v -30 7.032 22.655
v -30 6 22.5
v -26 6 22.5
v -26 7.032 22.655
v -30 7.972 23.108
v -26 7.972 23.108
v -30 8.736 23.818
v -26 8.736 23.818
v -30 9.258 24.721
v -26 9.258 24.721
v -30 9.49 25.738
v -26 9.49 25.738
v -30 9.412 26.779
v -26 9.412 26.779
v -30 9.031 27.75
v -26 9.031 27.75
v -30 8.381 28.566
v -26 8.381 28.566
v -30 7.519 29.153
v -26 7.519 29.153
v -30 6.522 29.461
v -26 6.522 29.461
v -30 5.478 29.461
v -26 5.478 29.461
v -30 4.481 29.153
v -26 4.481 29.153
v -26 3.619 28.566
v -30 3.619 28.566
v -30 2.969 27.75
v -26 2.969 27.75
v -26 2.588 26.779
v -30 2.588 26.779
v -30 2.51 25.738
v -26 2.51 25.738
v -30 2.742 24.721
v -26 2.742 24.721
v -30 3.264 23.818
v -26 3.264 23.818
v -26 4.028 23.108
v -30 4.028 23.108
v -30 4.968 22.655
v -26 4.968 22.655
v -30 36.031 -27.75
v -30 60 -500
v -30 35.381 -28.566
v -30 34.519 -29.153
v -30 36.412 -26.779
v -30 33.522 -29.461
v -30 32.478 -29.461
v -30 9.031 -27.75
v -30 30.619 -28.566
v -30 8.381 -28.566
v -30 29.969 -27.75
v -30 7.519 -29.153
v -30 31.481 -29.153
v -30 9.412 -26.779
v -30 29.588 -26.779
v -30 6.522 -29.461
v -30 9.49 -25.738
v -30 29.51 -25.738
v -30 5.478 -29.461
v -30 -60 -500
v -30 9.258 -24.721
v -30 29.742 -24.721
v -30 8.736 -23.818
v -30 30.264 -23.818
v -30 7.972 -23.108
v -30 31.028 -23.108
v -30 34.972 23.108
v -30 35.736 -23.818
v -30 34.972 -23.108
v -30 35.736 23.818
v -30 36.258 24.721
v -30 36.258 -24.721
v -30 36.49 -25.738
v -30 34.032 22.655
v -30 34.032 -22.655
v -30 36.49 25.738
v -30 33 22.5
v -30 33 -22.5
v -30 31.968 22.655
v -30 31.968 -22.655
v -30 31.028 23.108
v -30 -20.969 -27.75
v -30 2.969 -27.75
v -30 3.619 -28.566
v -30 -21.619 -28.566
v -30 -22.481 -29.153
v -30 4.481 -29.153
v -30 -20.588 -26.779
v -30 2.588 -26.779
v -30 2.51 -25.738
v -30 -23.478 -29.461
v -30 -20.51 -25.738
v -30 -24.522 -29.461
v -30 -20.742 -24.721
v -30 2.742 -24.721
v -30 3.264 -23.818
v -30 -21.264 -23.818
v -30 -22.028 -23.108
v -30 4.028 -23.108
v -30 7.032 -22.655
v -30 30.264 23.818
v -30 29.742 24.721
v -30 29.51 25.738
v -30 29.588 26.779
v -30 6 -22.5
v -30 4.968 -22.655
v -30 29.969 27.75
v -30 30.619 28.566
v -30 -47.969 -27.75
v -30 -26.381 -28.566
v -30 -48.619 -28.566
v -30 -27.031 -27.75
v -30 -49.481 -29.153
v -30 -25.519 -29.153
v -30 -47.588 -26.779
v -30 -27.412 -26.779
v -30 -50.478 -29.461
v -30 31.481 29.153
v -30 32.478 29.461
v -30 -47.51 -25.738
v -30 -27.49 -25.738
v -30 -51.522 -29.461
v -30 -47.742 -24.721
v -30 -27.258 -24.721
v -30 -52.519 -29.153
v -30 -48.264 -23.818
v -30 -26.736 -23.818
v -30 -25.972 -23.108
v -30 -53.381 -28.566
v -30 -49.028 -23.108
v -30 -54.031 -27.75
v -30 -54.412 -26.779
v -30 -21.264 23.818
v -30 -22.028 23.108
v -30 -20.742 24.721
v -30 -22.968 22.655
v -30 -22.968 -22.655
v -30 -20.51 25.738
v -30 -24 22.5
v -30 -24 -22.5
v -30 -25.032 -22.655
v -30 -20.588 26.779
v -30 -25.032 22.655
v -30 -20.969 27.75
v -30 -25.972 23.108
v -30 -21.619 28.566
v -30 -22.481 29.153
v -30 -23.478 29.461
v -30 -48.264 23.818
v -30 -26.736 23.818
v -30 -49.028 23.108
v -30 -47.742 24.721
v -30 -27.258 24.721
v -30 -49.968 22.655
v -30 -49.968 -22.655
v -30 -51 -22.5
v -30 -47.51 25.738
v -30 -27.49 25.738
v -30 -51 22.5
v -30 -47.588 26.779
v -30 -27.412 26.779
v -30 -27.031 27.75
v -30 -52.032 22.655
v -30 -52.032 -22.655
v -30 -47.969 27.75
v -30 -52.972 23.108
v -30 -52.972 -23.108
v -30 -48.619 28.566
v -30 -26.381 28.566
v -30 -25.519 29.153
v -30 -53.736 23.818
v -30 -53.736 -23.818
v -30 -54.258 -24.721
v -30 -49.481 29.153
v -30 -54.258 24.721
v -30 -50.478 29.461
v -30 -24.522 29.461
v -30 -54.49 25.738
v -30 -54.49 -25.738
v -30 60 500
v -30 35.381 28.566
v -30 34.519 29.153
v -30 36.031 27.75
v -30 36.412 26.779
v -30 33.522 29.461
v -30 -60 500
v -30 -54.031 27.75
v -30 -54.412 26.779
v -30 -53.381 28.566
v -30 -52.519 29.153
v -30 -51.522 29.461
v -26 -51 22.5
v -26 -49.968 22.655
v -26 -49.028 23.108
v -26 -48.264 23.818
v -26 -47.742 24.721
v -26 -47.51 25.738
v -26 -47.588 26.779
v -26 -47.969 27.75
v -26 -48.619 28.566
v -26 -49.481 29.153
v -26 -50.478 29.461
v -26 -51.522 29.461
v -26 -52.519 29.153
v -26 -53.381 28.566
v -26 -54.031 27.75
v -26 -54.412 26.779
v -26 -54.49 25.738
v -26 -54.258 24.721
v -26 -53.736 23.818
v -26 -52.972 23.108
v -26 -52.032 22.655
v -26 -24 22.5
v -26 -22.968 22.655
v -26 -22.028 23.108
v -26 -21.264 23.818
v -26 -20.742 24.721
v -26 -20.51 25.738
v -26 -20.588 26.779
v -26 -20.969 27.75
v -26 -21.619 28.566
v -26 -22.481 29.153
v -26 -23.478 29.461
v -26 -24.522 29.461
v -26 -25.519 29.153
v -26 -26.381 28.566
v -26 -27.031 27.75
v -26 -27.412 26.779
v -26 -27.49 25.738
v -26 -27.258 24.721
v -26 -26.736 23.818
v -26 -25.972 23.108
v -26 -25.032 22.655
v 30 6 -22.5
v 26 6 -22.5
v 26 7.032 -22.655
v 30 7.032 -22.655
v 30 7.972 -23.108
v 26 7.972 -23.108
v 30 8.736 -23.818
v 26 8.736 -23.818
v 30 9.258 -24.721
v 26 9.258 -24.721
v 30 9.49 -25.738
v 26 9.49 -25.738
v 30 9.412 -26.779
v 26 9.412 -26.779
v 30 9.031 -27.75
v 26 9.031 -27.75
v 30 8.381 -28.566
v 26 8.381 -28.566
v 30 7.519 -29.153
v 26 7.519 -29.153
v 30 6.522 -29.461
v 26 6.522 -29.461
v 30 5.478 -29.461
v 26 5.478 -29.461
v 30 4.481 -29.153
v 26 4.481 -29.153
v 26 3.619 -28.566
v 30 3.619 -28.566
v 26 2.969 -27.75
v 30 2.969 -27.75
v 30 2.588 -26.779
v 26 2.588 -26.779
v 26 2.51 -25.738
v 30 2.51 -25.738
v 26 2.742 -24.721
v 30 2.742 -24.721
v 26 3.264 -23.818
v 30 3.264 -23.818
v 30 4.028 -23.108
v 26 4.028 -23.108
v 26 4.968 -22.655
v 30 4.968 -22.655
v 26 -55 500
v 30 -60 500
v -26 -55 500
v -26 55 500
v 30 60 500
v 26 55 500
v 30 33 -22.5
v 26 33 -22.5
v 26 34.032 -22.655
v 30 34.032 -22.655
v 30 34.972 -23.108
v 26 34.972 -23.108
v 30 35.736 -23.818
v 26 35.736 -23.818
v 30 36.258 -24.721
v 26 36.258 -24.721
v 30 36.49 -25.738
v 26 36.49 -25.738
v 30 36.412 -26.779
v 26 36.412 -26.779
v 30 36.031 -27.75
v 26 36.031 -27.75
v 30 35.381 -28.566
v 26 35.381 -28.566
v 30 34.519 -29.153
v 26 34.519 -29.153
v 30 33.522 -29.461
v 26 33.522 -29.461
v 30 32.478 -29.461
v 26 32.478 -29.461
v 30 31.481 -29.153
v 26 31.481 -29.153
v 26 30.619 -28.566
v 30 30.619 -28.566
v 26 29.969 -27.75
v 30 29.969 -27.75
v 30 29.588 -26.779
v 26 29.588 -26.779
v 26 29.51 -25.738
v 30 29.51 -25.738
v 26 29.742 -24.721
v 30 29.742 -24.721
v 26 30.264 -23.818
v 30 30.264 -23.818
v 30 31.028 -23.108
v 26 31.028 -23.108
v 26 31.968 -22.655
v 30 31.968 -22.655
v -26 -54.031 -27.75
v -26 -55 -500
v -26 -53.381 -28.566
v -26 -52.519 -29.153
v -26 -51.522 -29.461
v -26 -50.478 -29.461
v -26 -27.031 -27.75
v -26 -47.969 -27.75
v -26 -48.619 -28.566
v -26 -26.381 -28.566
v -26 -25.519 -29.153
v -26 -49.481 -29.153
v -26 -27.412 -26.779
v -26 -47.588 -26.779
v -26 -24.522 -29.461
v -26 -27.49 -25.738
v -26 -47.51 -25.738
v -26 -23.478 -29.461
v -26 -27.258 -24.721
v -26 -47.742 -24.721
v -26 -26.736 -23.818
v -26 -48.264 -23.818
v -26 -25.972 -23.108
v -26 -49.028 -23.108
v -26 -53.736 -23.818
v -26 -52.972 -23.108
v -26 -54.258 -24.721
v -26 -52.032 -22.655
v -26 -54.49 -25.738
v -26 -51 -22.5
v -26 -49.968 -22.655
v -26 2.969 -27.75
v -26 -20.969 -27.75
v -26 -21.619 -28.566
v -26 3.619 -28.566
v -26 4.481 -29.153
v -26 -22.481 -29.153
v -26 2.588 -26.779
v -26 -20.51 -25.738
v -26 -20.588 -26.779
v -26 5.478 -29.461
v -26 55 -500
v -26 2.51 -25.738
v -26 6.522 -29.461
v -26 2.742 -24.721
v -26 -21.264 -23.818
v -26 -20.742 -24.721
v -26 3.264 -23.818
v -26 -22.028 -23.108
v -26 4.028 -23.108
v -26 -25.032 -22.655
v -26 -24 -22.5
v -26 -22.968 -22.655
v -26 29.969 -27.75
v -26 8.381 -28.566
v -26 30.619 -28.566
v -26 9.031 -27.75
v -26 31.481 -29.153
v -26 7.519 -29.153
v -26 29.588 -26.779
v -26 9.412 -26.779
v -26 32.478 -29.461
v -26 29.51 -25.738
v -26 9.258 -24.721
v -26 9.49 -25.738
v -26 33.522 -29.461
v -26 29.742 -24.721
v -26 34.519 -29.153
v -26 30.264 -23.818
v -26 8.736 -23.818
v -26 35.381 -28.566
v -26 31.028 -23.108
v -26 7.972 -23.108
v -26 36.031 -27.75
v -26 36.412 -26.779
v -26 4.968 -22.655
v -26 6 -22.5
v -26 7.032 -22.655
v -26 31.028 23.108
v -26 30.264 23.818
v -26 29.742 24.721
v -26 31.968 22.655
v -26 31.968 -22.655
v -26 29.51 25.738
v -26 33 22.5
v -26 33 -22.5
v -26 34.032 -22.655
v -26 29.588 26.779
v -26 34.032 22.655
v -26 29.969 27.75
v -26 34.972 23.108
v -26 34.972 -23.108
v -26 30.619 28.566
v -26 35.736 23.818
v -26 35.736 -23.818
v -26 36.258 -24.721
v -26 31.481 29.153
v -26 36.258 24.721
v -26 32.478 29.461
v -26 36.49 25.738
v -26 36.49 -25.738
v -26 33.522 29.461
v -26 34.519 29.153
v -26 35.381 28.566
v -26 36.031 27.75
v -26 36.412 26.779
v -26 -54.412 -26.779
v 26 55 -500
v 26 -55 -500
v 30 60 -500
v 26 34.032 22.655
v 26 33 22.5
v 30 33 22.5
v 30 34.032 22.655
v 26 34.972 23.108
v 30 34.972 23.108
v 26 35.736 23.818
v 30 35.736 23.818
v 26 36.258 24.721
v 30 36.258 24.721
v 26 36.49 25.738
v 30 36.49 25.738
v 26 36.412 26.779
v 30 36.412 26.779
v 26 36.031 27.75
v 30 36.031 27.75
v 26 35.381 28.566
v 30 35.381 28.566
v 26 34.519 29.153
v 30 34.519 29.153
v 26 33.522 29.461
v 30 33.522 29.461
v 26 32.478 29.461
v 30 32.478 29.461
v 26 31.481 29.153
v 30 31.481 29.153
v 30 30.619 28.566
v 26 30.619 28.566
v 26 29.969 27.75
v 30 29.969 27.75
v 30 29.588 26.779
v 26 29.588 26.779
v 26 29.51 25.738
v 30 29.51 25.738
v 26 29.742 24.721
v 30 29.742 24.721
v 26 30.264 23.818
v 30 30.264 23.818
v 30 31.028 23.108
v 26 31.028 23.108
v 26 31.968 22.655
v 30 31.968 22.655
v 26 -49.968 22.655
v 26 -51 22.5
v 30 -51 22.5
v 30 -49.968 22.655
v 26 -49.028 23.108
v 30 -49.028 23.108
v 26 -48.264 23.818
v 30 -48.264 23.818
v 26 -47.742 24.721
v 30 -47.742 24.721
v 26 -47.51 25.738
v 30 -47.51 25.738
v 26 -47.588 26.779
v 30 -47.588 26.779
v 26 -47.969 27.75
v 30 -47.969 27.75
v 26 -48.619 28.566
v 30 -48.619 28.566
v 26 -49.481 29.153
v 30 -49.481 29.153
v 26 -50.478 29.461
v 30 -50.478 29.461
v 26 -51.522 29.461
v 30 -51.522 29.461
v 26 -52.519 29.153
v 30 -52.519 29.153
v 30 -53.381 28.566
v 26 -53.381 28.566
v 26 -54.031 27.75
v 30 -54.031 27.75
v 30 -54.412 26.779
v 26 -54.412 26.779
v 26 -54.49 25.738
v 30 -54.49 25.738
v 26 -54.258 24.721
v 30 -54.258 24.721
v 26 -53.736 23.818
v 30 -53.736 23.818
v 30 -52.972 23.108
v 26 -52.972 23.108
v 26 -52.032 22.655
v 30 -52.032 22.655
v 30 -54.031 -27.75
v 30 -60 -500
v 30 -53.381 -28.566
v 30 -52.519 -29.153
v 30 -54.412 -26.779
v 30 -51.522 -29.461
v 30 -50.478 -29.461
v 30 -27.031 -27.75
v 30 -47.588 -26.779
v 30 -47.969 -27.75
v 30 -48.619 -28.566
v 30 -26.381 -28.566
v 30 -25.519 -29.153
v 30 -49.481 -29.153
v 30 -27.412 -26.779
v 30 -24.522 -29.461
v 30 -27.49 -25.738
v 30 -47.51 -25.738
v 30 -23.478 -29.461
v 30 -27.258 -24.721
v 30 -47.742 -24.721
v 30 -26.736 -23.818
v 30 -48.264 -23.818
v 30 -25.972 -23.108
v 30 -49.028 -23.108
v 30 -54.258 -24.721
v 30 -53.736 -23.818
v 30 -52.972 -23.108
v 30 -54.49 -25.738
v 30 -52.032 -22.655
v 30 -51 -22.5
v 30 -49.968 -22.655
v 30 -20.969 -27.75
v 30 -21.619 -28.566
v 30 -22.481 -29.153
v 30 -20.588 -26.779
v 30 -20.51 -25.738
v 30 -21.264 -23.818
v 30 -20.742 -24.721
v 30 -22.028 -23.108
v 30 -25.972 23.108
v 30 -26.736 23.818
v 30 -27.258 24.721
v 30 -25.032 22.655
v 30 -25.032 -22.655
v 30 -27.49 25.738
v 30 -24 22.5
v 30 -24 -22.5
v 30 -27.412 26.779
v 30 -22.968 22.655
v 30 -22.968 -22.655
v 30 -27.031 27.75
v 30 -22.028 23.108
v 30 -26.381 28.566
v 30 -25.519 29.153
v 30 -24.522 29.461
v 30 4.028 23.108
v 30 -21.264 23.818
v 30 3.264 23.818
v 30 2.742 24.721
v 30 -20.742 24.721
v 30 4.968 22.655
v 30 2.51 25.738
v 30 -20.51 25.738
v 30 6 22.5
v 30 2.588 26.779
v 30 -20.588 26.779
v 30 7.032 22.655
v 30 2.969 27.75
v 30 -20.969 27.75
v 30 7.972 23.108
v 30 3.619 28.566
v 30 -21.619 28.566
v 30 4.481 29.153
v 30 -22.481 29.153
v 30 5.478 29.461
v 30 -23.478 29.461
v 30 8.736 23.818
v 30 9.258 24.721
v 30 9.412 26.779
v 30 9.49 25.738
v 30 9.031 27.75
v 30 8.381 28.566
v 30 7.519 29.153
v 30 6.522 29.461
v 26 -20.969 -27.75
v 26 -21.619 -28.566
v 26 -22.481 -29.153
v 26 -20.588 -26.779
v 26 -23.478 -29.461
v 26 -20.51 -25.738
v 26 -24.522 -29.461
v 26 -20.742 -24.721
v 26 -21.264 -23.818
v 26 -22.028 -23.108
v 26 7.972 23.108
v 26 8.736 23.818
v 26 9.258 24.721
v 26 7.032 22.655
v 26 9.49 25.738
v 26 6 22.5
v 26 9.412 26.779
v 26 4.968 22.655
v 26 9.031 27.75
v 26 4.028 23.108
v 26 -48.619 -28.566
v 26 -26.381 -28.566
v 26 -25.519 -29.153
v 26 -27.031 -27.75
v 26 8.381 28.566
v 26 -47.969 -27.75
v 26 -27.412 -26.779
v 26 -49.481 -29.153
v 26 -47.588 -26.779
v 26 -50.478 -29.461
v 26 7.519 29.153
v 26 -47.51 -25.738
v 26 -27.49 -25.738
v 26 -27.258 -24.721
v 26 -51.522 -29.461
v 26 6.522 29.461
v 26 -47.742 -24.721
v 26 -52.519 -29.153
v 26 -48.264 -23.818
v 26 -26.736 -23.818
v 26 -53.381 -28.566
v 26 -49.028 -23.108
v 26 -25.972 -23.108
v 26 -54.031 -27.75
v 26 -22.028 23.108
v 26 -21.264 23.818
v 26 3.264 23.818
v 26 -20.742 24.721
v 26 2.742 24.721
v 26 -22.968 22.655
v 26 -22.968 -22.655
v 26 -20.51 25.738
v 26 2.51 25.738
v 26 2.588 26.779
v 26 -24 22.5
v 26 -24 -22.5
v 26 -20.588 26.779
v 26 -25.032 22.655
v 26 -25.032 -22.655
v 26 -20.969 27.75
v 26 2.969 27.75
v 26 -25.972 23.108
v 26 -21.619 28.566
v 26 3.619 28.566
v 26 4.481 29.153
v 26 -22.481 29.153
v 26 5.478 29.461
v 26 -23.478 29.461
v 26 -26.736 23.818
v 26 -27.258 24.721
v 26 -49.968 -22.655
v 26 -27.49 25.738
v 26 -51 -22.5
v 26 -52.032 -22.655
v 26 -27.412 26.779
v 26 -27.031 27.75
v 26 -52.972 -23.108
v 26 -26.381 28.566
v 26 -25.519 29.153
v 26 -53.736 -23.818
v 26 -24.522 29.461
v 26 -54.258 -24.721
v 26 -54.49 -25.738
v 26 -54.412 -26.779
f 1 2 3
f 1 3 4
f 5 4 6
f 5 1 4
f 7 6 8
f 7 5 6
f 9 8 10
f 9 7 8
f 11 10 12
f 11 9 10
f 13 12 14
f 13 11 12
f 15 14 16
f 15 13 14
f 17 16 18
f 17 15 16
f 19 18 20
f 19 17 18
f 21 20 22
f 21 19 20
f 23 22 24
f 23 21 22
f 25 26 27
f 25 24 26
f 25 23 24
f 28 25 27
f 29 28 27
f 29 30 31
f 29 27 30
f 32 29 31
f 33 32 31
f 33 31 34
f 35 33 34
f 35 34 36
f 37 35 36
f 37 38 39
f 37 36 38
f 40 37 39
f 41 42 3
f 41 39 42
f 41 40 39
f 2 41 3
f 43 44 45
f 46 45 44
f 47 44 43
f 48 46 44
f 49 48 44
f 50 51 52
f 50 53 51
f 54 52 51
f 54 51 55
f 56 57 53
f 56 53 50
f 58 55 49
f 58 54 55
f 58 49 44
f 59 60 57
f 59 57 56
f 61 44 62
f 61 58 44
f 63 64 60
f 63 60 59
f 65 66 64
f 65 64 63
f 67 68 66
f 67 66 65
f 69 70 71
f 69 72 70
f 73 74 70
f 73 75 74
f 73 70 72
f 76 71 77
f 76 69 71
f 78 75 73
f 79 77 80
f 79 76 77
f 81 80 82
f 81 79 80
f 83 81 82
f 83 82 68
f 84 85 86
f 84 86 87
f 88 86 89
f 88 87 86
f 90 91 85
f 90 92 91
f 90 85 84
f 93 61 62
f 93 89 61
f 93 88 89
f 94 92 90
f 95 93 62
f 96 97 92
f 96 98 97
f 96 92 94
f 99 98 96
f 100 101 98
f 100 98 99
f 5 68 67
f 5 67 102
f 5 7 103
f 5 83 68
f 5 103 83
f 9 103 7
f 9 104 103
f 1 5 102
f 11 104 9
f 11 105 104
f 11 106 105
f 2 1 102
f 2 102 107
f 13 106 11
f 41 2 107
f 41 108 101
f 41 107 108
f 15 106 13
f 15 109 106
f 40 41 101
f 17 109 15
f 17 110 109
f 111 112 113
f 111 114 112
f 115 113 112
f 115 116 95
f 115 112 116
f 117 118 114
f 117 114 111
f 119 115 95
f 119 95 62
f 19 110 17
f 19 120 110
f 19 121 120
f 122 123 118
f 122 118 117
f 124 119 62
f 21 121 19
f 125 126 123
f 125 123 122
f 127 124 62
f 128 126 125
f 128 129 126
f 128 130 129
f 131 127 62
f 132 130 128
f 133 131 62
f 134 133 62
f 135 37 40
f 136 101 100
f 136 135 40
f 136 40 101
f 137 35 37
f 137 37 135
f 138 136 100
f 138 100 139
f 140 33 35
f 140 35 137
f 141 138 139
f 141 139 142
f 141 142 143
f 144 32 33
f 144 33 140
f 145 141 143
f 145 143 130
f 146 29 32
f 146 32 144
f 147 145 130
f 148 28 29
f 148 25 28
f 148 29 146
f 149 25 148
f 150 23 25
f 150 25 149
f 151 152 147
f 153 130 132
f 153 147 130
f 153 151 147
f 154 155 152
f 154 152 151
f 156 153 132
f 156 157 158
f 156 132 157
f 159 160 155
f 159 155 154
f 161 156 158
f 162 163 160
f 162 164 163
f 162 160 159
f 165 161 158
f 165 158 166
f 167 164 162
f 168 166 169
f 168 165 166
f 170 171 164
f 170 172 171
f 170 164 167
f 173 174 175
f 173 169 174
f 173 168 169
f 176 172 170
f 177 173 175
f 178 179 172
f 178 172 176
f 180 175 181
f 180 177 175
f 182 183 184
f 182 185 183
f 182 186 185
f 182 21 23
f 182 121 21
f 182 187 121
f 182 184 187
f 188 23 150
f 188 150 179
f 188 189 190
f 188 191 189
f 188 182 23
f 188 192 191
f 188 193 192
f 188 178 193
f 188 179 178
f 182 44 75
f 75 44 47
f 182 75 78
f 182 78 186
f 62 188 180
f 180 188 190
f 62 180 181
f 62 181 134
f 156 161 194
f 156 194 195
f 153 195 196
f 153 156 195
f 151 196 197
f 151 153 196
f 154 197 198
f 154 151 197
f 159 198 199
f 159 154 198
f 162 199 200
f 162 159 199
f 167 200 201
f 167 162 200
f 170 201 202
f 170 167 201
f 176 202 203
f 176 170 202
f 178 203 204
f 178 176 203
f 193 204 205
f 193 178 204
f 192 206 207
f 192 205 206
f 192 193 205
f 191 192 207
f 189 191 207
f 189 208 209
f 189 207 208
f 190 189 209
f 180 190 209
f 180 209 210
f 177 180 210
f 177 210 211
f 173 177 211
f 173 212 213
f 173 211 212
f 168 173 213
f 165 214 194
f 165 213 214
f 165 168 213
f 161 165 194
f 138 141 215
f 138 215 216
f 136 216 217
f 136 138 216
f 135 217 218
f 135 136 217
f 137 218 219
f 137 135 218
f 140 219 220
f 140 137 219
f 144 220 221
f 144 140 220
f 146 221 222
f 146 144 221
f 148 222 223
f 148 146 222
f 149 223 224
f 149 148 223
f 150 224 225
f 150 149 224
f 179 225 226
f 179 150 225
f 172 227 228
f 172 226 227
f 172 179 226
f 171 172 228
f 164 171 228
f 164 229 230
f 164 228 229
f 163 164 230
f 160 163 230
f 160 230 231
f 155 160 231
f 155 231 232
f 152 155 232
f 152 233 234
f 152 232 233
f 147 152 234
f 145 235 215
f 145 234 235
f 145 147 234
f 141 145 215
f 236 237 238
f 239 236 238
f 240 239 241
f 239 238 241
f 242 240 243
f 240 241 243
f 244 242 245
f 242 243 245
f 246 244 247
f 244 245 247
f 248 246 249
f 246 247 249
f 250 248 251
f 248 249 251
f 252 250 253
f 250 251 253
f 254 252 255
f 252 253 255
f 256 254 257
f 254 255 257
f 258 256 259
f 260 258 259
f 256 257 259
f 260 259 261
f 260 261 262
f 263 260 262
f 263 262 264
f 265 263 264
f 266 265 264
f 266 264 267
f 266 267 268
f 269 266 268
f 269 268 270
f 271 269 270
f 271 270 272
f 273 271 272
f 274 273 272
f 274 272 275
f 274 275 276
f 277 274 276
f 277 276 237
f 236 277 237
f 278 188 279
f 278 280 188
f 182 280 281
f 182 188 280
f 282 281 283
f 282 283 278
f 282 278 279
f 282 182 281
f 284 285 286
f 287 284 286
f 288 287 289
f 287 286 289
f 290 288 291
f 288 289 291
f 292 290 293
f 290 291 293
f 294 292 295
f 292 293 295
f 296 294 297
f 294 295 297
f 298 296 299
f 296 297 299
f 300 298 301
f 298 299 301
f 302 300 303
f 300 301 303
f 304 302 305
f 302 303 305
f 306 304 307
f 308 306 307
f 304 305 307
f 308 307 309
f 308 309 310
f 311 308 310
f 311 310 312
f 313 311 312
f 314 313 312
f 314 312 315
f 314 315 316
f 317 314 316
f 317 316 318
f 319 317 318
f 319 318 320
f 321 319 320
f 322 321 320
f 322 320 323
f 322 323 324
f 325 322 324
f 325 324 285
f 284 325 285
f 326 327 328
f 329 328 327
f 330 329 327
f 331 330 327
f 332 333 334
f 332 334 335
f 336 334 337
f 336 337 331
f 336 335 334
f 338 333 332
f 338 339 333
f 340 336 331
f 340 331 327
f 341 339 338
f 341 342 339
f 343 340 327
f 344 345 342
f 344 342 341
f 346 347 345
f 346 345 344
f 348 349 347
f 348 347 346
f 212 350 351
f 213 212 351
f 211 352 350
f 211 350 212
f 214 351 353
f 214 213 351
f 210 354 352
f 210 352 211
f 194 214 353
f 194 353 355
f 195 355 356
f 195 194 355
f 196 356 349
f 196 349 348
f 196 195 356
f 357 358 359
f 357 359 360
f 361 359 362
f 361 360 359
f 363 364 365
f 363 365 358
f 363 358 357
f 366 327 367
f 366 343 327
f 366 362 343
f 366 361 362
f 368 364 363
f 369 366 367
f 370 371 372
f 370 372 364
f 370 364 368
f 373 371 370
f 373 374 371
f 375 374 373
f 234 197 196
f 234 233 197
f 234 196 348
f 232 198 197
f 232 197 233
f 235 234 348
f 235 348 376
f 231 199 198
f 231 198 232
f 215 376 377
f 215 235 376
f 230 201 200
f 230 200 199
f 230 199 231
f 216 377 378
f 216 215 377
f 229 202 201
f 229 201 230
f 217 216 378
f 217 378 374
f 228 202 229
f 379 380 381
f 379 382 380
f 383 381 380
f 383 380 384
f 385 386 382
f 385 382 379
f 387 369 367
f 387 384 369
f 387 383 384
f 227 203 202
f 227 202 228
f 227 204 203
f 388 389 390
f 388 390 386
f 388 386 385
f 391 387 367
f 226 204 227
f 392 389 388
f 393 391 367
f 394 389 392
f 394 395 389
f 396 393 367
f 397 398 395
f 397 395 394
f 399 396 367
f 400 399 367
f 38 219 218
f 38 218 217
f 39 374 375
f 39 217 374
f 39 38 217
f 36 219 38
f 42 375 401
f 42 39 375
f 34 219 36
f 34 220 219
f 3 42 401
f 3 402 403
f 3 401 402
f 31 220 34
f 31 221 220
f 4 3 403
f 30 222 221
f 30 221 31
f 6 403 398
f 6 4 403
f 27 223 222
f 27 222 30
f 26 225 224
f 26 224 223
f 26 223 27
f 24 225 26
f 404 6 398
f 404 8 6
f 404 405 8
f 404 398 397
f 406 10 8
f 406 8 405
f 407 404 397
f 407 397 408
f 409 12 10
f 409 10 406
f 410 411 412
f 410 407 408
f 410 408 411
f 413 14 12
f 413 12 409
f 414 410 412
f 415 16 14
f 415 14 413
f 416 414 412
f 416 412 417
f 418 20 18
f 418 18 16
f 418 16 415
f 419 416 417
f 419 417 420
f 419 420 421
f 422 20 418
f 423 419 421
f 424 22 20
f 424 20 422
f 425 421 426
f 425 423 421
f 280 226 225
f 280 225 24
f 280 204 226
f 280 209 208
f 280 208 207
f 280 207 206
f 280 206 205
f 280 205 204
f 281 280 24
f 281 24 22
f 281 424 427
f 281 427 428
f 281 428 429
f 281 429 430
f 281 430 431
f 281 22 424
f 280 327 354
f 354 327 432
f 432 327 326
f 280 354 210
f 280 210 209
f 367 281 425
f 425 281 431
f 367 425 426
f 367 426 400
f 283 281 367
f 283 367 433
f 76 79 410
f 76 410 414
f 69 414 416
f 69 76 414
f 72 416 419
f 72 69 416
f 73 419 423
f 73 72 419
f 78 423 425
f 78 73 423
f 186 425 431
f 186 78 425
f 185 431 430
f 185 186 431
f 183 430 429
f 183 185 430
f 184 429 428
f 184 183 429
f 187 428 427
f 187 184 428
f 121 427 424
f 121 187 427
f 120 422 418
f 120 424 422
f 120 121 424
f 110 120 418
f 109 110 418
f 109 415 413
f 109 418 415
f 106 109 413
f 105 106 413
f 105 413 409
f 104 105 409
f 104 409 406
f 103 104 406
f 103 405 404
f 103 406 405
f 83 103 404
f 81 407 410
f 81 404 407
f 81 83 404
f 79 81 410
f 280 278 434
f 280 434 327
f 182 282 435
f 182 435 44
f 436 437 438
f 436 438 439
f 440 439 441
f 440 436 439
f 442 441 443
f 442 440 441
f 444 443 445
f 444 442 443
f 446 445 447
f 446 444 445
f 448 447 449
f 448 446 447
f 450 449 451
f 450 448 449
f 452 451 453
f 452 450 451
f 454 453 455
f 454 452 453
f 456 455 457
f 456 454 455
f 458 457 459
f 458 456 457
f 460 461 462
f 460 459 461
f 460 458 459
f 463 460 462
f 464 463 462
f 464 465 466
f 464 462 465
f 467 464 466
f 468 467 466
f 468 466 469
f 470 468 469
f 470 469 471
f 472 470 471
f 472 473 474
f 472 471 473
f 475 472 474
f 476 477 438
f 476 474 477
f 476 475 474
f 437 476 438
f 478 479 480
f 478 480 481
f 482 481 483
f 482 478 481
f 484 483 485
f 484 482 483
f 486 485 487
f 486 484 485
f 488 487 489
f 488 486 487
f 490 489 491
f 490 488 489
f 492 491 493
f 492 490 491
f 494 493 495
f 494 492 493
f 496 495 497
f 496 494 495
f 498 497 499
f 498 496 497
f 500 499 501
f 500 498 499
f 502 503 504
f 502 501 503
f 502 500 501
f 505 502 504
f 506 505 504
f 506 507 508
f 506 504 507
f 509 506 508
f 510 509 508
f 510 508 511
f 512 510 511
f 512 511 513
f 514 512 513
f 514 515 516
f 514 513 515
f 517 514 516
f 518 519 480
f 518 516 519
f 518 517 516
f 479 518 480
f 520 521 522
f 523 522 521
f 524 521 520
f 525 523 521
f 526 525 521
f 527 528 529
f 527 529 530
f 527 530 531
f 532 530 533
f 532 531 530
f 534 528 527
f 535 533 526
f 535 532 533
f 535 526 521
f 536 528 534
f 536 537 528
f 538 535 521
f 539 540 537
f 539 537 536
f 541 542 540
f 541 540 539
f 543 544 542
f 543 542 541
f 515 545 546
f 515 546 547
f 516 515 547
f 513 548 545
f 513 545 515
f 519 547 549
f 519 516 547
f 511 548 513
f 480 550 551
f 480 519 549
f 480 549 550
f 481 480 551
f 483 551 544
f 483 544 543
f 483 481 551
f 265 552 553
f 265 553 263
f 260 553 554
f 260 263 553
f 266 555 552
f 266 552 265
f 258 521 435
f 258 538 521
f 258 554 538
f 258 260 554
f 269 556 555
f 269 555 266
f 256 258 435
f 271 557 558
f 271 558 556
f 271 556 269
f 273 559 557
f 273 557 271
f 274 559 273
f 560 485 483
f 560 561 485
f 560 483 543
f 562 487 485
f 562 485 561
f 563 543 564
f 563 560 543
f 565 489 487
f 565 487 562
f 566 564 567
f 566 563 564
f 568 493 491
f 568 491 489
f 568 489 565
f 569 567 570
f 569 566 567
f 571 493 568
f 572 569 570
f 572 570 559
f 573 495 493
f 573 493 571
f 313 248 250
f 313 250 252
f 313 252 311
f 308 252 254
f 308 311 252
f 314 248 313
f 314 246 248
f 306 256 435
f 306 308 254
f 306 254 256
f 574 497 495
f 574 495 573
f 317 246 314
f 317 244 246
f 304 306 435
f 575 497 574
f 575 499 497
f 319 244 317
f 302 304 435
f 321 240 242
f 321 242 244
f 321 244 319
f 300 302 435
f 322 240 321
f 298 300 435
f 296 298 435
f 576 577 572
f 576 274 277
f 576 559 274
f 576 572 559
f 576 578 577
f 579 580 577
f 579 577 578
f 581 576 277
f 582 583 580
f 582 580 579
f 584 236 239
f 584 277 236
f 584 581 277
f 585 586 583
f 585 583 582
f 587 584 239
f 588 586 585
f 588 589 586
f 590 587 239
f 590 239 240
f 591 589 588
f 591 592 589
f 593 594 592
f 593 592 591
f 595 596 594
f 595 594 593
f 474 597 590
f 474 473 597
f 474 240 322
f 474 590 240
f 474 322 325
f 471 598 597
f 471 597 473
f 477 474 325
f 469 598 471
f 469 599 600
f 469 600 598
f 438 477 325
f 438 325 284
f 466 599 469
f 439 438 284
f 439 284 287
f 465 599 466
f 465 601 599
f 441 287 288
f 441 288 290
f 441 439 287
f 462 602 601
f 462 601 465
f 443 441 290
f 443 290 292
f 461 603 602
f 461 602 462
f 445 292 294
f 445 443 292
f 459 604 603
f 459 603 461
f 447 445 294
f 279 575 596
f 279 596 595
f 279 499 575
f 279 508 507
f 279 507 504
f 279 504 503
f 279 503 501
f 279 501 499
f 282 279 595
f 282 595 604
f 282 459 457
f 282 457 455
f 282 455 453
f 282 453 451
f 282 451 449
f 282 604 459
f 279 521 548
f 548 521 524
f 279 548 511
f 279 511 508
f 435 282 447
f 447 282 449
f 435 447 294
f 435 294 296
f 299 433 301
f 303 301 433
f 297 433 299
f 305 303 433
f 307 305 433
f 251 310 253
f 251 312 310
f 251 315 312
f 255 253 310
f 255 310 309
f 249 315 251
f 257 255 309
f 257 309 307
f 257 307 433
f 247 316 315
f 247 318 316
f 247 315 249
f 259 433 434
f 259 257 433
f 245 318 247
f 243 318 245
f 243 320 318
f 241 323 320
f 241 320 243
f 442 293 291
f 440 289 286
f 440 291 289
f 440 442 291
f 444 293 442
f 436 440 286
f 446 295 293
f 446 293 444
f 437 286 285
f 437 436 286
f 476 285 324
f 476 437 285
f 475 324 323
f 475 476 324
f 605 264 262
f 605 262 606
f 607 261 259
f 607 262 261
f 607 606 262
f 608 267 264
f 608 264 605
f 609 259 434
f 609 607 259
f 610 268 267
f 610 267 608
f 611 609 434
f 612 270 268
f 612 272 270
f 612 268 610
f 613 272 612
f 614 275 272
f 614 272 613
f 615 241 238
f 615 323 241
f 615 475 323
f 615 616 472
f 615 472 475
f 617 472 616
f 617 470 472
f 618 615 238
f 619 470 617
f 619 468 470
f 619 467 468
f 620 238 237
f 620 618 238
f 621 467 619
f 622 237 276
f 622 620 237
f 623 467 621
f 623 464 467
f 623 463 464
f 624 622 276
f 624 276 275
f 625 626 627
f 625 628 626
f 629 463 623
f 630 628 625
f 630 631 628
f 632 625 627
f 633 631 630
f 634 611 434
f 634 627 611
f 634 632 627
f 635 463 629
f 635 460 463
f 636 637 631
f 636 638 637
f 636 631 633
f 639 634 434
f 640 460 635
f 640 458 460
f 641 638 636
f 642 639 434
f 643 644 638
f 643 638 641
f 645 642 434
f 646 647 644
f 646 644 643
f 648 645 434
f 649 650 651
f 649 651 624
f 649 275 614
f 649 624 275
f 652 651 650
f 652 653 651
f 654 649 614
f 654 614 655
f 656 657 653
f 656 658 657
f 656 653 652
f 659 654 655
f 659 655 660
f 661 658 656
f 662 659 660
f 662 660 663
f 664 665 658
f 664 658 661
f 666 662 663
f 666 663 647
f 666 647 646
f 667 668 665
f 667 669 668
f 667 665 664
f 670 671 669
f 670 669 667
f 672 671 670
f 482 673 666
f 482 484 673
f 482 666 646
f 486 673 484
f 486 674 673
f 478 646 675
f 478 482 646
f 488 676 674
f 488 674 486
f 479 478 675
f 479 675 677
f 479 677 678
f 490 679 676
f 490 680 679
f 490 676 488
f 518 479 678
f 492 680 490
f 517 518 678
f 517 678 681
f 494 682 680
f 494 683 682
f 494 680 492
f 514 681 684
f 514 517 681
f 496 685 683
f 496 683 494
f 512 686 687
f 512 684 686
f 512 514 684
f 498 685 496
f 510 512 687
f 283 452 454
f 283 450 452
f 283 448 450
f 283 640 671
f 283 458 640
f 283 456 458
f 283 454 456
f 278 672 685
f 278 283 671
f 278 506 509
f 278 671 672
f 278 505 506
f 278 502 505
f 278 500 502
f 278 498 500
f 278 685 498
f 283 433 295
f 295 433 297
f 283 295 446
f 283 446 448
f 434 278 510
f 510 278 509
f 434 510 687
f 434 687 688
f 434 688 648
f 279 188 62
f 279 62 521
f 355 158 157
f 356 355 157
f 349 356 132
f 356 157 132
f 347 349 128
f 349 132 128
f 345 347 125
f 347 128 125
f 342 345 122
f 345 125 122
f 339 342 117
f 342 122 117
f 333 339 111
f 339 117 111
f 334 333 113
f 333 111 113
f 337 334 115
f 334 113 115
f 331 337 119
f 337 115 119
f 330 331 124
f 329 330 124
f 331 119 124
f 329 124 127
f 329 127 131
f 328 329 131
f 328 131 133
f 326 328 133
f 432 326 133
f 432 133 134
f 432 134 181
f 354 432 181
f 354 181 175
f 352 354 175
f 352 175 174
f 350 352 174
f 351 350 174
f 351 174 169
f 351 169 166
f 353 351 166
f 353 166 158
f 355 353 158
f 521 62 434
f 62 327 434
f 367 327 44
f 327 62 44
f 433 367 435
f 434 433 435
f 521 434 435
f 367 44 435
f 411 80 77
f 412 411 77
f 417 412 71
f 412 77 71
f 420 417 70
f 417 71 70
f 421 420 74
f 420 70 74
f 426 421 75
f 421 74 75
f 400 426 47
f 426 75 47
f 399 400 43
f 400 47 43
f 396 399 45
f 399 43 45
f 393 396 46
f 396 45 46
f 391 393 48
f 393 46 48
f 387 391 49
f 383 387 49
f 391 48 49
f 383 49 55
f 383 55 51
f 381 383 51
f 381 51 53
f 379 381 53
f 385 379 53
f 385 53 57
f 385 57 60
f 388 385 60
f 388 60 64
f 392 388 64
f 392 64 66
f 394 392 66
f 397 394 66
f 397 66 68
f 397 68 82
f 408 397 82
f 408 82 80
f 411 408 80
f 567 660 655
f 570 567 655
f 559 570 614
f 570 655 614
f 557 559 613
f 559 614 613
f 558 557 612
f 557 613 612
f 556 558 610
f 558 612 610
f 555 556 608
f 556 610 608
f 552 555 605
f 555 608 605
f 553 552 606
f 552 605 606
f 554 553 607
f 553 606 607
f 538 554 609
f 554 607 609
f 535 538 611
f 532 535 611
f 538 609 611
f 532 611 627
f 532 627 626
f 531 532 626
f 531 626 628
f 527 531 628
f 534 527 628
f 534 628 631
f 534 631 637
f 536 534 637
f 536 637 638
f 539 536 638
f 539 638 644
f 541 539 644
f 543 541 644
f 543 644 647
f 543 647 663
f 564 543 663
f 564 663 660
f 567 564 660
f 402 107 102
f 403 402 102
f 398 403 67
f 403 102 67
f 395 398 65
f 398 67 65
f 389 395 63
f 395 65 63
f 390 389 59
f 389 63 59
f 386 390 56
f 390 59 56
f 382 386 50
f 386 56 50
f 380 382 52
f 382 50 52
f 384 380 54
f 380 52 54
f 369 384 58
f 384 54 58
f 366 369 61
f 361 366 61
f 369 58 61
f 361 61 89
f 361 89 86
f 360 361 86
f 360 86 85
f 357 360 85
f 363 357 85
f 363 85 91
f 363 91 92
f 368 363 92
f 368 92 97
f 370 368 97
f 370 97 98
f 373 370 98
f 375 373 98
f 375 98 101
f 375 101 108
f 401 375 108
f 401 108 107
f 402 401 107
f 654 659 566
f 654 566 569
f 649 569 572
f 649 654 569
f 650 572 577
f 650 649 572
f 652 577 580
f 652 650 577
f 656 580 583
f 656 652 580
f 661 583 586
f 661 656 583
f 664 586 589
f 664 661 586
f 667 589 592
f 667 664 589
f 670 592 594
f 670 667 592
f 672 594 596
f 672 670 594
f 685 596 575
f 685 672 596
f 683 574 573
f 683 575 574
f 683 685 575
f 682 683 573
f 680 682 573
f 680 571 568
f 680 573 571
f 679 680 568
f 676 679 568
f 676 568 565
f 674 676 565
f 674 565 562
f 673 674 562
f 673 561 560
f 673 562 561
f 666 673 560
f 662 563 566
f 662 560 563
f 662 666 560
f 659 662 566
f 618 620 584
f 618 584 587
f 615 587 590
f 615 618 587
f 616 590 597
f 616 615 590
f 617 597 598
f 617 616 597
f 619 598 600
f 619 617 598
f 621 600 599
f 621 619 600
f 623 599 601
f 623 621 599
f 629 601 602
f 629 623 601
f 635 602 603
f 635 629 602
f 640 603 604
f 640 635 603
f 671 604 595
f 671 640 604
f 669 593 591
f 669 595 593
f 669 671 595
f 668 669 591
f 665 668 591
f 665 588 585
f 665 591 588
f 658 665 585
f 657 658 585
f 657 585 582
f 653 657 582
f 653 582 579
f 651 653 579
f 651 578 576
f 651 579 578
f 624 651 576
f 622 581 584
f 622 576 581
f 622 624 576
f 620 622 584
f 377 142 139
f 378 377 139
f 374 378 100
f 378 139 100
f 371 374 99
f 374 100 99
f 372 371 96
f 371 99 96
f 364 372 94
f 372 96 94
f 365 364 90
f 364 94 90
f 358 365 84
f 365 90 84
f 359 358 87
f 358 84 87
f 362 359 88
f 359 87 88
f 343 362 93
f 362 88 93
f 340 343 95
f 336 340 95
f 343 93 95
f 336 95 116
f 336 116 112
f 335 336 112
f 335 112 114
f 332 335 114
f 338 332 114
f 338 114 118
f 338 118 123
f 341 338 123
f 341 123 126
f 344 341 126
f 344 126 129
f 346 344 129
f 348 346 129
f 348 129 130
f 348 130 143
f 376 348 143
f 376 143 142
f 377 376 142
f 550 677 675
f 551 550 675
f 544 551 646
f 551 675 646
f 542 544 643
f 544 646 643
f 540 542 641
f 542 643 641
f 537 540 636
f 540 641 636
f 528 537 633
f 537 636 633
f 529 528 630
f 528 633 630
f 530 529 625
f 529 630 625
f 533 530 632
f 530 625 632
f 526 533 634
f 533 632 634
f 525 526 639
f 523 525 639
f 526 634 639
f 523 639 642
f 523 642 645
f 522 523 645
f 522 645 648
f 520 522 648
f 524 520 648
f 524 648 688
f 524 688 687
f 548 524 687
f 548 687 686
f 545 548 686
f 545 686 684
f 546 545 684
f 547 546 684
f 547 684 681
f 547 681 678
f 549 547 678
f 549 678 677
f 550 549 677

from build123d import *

# Parameters (mm, degrees)
SKETCH1_W                = 60
SKETCH1_H                = 120
SKETCH1_W_2              = 52
SKETCH1_H_2              = 110
F_7_0_7_DIAMETER_HOLE1_D = 7


with BuildPart() as part:
    # Sweep1: sweep along a curve in space
    with BuildLine() as sweep1_path:
        add(Edge.make_bspline(
            [(0, 0, -500), (0, 0, 500)],
            knots=[0, 0, 1, 1], degree=1))
    # Sketch1 → Sweep1 (sweep)
    with BuildSketch(Plane.XY):
        Rectangle(SKETCH1_W, SKETCH1_H)
        Rectangle(SKETCH1_W_2, SKETCH1_H_2, mode=Mode.SUBTRACT)
    sweep(path=sweep1_path.line)

    # Ø7.0 (7) Diameter Hole1 (through all)
    with Locations(Plane(origin=(30, 0, 0), x_dir=(0, 0, -1), z_dir=(1, 0, 0))):
        with Locations((26, 33), (26, 6), (26, -24), (26, -51)):
            f_7_0_7_diameter_hole1 = Hole(F_7_0_7_DIAMETER_HOLE1_D / 2)

    # Mirror1: Ø7.0 (7) Diameter Hole1 across plane
    add(f_7_0_7_diameter_hole1.mirror(Plane.XY), mode=Mode.SUBTRACT)


solid = part.part
